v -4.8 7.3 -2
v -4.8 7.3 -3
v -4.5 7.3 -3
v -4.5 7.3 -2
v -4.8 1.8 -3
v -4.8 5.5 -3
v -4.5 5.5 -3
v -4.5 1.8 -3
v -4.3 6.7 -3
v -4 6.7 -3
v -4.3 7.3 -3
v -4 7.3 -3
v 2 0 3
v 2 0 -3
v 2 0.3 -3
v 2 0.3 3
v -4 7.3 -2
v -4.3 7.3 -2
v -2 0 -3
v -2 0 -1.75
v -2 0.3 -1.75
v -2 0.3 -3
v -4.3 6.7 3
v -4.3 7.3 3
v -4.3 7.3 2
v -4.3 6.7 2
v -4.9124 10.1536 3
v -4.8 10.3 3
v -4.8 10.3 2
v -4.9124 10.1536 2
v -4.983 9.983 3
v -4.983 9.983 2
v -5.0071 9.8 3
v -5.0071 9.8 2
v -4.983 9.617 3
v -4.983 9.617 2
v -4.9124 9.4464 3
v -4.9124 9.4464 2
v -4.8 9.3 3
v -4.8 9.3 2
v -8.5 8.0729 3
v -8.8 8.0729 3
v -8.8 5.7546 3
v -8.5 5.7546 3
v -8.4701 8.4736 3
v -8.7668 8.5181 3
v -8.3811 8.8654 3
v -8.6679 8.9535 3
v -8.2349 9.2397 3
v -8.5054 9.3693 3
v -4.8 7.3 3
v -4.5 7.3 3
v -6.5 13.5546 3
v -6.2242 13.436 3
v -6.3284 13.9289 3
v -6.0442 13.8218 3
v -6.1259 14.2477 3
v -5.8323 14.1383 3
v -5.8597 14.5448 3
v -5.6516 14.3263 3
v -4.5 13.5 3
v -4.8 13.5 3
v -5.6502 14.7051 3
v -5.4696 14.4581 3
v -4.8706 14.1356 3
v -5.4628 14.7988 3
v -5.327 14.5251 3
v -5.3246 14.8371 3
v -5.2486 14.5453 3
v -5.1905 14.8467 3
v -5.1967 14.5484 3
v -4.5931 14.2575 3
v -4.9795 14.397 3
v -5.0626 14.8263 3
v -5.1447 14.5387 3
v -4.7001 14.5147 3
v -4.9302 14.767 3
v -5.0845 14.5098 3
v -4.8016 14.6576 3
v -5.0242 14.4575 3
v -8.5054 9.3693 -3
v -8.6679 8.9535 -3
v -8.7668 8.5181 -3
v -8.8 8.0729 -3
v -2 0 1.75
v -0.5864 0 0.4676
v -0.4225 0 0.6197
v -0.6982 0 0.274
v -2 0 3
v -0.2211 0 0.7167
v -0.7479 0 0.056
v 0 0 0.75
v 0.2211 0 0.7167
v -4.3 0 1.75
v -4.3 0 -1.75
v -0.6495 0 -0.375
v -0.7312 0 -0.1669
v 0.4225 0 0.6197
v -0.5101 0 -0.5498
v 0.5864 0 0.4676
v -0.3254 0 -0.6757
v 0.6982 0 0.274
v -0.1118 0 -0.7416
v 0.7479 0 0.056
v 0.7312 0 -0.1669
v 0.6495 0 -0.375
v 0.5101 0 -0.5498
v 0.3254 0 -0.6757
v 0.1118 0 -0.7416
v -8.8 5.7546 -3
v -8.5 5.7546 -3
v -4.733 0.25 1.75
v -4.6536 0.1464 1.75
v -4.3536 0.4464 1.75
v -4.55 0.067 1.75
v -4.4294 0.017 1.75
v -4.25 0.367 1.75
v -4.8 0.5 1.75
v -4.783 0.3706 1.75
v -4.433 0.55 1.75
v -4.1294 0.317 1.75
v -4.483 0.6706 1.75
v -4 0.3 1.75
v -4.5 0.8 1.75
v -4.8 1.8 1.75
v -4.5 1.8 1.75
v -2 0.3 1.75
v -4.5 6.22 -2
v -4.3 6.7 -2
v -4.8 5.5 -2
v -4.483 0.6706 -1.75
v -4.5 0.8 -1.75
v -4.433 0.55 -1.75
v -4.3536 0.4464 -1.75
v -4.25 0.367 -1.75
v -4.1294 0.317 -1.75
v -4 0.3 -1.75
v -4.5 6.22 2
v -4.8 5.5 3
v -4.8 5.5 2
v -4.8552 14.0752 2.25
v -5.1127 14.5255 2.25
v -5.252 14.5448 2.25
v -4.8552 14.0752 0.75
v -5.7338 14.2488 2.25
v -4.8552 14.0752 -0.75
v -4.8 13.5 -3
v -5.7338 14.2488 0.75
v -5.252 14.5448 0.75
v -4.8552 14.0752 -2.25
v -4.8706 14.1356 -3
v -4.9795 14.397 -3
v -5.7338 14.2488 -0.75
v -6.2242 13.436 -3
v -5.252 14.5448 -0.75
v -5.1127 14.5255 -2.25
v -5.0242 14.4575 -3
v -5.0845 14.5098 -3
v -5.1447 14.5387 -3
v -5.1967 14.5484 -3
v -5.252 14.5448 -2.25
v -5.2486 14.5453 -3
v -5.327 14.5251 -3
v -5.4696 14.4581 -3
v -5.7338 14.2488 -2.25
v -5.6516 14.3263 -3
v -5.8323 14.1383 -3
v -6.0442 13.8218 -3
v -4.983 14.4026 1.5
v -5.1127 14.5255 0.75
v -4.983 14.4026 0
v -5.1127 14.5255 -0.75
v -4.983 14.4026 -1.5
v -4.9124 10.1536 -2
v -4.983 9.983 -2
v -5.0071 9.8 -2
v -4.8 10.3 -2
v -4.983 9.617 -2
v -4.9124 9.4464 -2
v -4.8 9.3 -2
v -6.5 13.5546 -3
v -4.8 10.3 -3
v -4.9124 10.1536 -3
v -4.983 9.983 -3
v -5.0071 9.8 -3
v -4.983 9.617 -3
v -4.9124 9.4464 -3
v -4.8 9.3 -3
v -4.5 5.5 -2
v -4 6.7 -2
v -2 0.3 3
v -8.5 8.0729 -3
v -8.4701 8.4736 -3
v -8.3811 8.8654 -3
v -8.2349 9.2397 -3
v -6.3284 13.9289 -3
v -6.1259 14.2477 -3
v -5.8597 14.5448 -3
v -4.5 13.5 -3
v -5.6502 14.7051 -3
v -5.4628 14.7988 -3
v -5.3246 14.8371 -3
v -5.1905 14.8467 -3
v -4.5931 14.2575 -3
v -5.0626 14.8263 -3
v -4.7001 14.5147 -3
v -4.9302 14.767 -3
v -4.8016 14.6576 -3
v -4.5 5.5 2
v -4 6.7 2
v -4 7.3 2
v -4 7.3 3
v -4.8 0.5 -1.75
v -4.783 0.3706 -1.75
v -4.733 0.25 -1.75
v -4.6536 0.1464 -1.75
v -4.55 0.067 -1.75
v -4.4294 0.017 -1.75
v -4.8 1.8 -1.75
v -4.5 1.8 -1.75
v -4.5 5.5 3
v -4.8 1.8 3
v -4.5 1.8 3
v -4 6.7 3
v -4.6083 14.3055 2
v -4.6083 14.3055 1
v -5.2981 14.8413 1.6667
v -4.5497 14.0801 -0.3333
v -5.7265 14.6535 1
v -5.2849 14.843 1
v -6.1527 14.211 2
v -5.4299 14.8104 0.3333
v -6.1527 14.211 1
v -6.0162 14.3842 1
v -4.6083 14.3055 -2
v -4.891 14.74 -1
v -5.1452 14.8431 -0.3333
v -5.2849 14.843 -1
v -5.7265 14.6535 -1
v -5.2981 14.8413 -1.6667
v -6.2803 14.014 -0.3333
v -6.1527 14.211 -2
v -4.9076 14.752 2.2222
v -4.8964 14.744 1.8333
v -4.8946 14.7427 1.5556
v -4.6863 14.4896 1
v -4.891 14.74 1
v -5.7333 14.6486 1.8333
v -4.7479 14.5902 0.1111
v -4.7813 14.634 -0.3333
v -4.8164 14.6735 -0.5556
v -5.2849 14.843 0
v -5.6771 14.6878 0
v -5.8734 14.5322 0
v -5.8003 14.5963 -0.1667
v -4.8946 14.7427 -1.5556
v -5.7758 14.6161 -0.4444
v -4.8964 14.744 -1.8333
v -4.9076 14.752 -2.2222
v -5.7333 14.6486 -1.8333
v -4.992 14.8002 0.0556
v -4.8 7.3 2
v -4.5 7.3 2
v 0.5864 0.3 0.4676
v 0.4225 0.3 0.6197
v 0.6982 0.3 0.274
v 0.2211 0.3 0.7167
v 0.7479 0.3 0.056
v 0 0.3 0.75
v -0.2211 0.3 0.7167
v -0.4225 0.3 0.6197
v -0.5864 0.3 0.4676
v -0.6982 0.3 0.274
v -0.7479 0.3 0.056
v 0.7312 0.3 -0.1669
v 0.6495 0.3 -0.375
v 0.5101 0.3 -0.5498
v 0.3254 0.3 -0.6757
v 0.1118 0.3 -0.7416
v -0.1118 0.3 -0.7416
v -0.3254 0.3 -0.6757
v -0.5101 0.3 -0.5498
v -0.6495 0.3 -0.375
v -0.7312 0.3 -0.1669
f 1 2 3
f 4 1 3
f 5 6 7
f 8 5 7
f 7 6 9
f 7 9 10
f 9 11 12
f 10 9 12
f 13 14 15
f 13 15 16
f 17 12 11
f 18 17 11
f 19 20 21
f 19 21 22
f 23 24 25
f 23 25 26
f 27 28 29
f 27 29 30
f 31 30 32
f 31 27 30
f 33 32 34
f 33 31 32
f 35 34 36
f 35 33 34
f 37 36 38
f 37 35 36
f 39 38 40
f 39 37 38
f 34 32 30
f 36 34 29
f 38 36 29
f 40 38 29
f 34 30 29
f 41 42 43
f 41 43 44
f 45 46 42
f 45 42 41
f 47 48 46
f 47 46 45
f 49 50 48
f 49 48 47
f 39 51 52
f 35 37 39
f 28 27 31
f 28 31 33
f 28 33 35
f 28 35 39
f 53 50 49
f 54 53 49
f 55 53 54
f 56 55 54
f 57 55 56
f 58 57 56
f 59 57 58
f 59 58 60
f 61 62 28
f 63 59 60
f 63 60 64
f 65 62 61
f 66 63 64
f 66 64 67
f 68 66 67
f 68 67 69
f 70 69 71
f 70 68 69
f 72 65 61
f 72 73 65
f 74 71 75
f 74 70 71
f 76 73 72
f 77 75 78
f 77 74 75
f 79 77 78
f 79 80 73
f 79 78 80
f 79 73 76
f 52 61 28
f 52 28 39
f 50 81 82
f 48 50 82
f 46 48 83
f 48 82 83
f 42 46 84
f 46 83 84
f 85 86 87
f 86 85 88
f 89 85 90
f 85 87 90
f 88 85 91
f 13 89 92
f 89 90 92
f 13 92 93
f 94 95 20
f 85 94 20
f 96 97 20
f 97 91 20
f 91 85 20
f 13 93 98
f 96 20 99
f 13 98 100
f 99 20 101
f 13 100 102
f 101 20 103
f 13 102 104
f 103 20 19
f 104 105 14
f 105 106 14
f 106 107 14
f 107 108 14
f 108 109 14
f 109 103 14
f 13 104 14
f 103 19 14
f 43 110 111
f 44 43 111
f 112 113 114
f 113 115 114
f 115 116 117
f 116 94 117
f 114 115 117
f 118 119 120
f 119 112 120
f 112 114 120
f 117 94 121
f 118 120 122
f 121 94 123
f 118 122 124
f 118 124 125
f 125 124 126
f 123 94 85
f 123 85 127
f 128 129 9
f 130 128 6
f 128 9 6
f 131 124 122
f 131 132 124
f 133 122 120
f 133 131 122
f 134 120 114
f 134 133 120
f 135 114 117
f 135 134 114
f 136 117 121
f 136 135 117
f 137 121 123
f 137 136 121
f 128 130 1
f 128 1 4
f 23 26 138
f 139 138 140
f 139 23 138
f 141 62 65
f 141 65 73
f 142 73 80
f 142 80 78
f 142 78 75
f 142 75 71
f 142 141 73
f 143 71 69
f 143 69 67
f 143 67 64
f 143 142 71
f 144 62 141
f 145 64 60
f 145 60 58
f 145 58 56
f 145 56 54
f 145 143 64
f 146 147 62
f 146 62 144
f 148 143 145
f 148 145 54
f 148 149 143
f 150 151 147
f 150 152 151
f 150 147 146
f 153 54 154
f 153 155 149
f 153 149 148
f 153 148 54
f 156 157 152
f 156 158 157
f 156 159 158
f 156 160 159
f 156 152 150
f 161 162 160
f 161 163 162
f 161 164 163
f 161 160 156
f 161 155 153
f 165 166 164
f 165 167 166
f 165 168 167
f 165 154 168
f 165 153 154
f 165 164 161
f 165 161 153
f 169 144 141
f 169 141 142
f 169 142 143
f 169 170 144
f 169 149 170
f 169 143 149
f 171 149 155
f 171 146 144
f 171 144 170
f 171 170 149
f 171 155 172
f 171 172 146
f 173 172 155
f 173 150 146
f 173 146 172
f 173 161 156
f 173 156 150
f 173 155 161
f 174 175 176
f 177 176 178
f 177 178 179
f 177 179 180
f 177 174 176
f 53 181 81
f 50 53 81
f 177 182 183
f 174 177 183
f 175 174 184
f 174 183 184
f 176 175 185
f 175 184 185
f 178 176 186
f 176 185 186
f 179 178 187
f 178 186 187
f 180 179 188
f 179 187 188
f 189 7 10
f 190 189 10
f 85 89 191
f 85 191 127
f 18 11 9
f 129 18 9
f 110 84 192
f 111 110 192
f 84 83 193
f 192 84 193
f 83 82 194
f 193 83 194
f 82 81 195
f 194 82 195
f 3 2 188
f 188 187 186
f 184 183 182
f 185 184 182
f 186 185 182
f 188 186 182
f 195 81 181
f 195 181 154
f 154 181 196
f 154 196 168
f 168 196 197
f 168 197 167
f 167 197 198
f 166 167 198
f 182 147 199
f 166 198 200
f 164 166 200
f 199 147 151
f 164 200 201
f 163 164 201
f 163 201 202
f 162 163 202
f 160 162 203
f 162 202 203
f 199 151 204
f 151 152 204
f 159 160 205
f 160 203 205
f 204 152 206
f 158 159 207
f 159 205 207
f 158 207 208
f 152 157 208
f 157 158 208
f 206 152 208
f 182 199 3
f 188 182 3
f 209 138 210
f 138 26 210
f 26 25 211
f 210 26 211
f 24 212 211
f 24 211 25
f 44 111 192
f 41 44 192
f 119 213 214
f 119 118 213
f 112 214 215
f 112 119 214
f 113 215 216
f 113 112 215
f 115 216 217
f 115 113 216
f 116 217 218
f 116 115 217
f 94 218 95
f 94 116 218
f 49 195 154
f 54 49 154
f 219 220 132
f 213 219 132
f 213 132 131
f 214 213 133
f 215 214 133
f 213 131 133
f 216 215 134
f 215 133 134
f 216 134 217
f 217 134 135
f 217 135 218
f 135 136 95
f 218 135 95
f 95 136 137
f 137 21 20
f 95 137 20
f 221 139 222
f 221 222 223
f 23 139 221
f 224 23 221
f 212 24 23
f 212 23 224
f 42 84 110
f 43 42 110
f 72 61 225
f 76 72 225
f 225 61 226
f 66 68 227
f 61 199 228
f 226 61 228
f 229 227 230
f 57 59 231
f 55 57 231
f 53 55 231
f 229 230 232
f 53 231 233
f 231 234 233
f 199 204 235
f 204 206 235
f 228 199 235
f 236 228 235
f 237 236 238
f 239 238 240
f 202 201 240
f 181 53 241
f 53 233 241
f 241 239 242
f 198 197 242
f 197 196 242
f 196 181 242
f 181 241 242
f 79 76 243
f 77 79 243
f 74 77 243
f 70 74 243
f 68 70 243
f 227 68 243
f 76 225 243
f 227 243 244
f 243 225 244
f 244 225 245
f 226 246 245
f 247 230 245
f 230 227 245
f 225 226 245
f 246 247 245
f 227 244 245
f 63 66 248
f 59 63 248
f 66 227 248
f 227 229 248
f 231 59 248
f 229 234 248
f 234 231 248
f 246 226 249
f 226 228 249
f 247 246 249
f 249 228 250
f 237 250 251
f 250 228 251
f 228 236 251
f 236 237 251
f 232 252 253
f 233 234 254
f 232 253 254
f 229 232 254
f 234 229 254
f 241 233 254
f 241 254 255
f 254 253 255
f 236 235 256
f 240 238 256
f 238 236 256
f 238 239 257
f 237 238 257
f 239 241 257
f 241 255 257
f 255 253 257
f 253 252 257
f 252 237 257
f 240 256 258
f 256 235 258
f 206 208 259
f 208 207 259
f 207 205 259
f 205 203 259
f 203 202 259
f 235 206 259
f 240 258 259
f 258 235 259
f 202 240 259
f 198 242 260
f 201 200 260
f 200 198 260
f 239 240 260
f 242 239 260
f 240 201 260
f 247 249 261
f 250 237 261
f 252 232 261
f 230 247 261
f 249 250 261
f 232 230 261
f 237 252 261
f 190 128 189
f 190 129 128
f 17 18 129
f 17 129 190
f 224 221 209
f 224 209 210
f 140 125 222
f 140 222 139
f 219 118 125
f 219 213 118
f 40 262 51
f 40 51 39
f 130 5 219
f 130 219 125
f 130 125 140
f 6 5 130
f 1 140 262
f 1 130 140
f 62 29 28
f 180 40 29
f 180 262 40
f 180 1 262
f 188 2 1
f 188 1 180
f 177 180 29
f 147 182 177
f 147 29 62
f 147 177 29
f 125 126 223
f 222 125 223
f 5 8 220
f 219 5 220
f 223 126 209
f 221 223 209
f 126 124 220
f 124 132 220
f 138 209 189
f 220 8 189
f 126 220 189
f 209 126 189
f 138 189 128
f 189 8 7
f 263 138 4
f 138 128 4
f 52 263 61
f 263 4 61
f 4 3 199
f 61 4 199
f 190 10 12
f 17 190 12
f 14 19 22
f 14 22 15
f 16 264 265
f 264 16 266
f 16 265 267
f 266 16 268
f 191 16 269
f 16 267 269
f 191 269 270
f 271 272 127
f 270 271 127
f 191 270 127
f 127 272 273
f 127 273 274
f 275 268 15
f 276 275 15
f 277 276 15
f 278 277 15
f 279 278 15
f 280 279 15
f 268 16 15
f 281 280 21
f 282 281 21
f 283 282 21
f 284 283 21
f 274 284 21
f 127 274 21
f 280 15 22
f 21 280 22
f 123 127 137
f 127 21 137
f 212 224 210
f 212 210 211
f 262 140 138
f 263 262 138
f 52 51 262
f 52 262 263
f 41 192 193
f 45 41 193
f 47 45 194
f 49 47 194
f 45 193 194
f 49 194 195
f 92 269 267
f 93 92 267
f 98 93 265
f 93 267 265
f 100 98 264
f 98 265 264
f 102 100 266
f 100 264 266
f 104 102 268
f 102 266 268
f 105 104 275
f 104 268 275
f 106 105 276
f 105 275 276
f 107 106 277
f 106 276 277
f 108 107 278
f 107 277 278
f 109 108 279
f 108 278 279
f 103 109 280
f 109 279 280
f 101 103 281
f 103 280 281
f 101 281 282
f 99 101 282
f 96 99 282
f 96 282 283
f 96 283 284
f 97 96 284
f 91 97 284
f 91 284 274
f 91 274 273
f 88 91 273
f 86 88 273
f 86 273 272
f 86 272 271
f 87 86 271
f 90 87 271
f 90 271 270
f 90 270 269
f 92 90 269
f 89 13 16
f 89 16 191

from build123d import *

# Parameters (mm, degrees)
BOSS_EXTRUDE1_DEPTH      = 0.3
BOSS_EXTRUDE2_DEPTH      = 3
BOSS_EXTRUDE2_DEPTH_BACK = 3
BOSS_EXTRUDE2_START      = -1.75
SKETCH2_W                = 0.3
SKETCH2_H                = 13.5
BOSS_EXTRUDE3_DEPTH      = 3
BOSS_EXTRUDE3_DEPTH_BACK = 3
BOSS_EXTRUDE3_START      = -1.75
CUT_EXTRUDE1_REACH       = 19.264
SKETCH4_R                = 0.75
CUT_EXTRUDE2_REACH       = 18.483
SKETCH7_W                = 0.3
SKETCH7_H                = 1.8
CUT_EXTRUDE3_DEPTH       = 1
BOSS_EXTRUDE4_DEPTH      = 1
BOSS_EXTRUDE5_DEPTH      = 1
FILLET1_R                = 0.5


with BuildPart() as part:
    # Sketch1 → Boss-Extrude1 (new body)
    with BuildSketch(Plane(origin=(0, 0, 0), x_dir=(1, 0, 0), z_dir=(0, 1, 0))):
        Polygon((-2, 3), (2, 3), (2, -3), (-2, -3), (-2, -1.75), (-4.5, -1.75), (-4.5, 1.75), (-2, 1.75), align=None)
    extrude(amount=BOSS_EXTRUDE1_DEPTH)

    # Sketch2 → Boss-Extrude2 (add, two sides: drawn at the far end of the back side and taken through both)
    with BuildSketch(Plane.XY.offset(1.75).offset(BOSS_EXTRUDE2_START - BOSS_EXTRUDE2_DEPTH_BACK)):
        with Locations((-4.65, 6.75)):
            Rectangle(SKETCH2_W, SKETCH2_H)
    extrude(amount=BOSS_EXTRUDE2_DEPTH + BOSS_EXTRUDE2_DEPTH_BACK)

    # Sketch3 → Boss-Extrude3 (add, two sides: drawn at the far end of the back side and taken through both)
    with BuildSketch(Plane.XY.offset(1.75).offset(BOSS_EXTRUDE3_START - BOSS_EXTRUDE3_DEPTH_BACK)):
        with BuildLine():
            Line((-6.5, 13.554573958), (-8.505448086, 9.369290995))
            ThreePointArc((-8.505448086, 9.369290995), (-8.725435374, 8.737631794), (-8.8, 8.072930454))
            Line((-8.8, 8.072930454), (-8.8, 5.754573958))
            Line((-8.8, 5.754573958), (-8.5, 5.754573958))
            Line((-8.5, 5.754573958), (-8.5, 8.072930454))
            ThreePointArc((-8.5, 8.072930454), (-8.432891837, 8.67116166), (-8.234903278, 9.239654941))
            Line((-8.234903278, 9.239654941), (-6.224158485, 13.435991899))
            add(Edge.make_bspline(
                [(-4.8, 13.499999998), (-4.800000001, 13.60647764), (-4.810501359, 13.834290272), (-4.865595968, 14.168326182), (-4.985627931, 14.441197759), (-5.11401111, 14.537231122), (-5.274676327, 14.571482274), (-5.645213861, 14.387952807), (-6.003576613, 13.924542153), (-6.162685709, 13.596781364), (-6.224158485, 13.435991899)],
                knots=[0, 0, 0, 0, 0.062658964, 0.125317927, 0.250635855, 0.375953782, 0.50127171, 0.751907565, 0.877225492, 1.00254342, 1.00254342, 1.00254342, 1.00254342], degree=3))
            Line((-4.8, 13.499999998), (-4.5, 13.5))
            add(Edge.make_bspline(
                [(-4.5, 13.5), (-4.500000011, 15.507992756), (-5.926328545, 15.055080891), (-6.5, 13.554573958)],
                knots=[0, 0, 0, 0, 1, 1, 1, 1], degree=3))
        make_face()
    extrude(amount=BOSS_EXTRUDE3_DEPTH + BOSS_EXTRUDE3_DEPTH_BACK)

    # Sketch4 → Cut-Extrude1 (cut, up to next)
    with BuildSketch(Plane(origin=(0, 0.3, 0), x_dir=(1, 0, 0), z_dir=(0, 1, 0)), mode=Mode.PRIVATE) as cut_extrude1_sk1:
        with Locations(Location((0, 0, 0), (0, 0, 270))):
            Circle(SKETCH4_R)
    cut_extrude1_tool1 = extrude(cut_extrude1_sk1.sketch, amount=-CUT_EXTRUDE1_REACH, mode=Mode.PRIVATE) & part.part
    add(cut_extrude1_tool1.solids().sort_by_distance((0, 0.3, 0))[0], mode=Mode.SUBTRACT)

    # Sketch6 → Cut-Extrude2 (cut, up to next)
    with BuildSketch(Plane(origin=(-4.5, 0, 0), x_dir=(0, 0, -1), z_dir=(1, 0, 0)), mode=Mode.PRIVATE) as cut_extrude2_sk1:
        Polygon((1.75, 1.8), (1.75, 0.3), (1.75, 0), (3, 0), (3, 1.8), align=None)
    cut_extrude2_tool1 = extrude(cut_extrude2_sk1.sketch, amount=-CUT_EXTRUDE2_REACH, mode=Mode.PRIVATE) & part.part
    # Sketch6 → Cut-Extrude2 (cut, up to next)
    with BuildSketch(Plane(origin=(-4.5, 0, 0), x_dir=(0, 0, -1), z_dir=(1, 0, 0)), mode=Mode.PRIVATE) as cut_extrude2_sk2:
        Polygon((-1.75, 0.3), (-1.75, 1.8), (-3, 1.8), (-3, 0), (-1.75, 0), align=None)
    cut_extrude2_tool2 = extrude(cut_extrude2_sk2.sketch, amount=-CUT_EXTRUDE2_REACH, mode=Mode.PRIVATE) & part.part
    add(cut_extrude2_tool1.solids().sort_by_distance((-4.5, 0.9, -2.375))[0], mode=Mode.SUBTRACT)
    add(cut_extrude2_tool2.solids().sort_by_distance((-4.5, 0.9, 2.375))[0], mode=Mode.SUBTRACT)

    # Sketch7 → Cut-Extrude3 (cut)
    with BuildSketch(Plane.XY.offset(3)):
        with Locations((-4.65, 6.4)):
            Rectangle(SKETCH7_W, SKETCH7_H)
    cut_extrude3 = extrude(amount=-CUT_EXTRUDE3_DEPTH, mode=Mode.SUBTRACT)

    # Mirror1: Cut-Extrude3 across plane
    add(cut_extrude3.mirror(Plane.XY), mode=Mode.SUBTRACT)

    # Sketch8 → Boss-Extrude4 (add)
    with BuildSketch(Plane.XY.offset(3)):
        Polygon((-4.5, 5.5), (-4, 6.7), (-4, 7.3), (-4.3, 7.3), (-4.3, 6.7), (-4.8, 5.5), align=None)
    boss_extrude4 = extrude(amount=-BOSS_EXTRUDE4_DEPTH)

    # Mirror2: Boss-Extrude4 across plane
    add(boss_extrude4.mirror(Plane.XY))

    # Sketch9 → Boss-Extrude5 (add)
    with BuildSketch(Plane.XY.offset(3)):
        with BuildLine():
            Line((-4.8, 9.3), (-4.8, 10.3))
            ThreePointArc((-4.8, 10.3), (-5.007106781, 9.8), (-4.8, 9.3))
        make_face()
    boss_extrude5 = extrude(amount=-BOSS_EXTRUDE5_DEPTH)

    # Mirror4: Boss-Extrude5 across plane
    add(boss_extrude5.mirror(Plane.XY))

    # Fillet1
    fillet1_edges = [part.edges().sort_by_distance(p)[0] for p in [
        (-4.5, 0.3, 0),
        (-4.8, 0, 0),
    ]]
    fillet(fillet1_edges, radius=FILLET1_R)


solid = part.part
